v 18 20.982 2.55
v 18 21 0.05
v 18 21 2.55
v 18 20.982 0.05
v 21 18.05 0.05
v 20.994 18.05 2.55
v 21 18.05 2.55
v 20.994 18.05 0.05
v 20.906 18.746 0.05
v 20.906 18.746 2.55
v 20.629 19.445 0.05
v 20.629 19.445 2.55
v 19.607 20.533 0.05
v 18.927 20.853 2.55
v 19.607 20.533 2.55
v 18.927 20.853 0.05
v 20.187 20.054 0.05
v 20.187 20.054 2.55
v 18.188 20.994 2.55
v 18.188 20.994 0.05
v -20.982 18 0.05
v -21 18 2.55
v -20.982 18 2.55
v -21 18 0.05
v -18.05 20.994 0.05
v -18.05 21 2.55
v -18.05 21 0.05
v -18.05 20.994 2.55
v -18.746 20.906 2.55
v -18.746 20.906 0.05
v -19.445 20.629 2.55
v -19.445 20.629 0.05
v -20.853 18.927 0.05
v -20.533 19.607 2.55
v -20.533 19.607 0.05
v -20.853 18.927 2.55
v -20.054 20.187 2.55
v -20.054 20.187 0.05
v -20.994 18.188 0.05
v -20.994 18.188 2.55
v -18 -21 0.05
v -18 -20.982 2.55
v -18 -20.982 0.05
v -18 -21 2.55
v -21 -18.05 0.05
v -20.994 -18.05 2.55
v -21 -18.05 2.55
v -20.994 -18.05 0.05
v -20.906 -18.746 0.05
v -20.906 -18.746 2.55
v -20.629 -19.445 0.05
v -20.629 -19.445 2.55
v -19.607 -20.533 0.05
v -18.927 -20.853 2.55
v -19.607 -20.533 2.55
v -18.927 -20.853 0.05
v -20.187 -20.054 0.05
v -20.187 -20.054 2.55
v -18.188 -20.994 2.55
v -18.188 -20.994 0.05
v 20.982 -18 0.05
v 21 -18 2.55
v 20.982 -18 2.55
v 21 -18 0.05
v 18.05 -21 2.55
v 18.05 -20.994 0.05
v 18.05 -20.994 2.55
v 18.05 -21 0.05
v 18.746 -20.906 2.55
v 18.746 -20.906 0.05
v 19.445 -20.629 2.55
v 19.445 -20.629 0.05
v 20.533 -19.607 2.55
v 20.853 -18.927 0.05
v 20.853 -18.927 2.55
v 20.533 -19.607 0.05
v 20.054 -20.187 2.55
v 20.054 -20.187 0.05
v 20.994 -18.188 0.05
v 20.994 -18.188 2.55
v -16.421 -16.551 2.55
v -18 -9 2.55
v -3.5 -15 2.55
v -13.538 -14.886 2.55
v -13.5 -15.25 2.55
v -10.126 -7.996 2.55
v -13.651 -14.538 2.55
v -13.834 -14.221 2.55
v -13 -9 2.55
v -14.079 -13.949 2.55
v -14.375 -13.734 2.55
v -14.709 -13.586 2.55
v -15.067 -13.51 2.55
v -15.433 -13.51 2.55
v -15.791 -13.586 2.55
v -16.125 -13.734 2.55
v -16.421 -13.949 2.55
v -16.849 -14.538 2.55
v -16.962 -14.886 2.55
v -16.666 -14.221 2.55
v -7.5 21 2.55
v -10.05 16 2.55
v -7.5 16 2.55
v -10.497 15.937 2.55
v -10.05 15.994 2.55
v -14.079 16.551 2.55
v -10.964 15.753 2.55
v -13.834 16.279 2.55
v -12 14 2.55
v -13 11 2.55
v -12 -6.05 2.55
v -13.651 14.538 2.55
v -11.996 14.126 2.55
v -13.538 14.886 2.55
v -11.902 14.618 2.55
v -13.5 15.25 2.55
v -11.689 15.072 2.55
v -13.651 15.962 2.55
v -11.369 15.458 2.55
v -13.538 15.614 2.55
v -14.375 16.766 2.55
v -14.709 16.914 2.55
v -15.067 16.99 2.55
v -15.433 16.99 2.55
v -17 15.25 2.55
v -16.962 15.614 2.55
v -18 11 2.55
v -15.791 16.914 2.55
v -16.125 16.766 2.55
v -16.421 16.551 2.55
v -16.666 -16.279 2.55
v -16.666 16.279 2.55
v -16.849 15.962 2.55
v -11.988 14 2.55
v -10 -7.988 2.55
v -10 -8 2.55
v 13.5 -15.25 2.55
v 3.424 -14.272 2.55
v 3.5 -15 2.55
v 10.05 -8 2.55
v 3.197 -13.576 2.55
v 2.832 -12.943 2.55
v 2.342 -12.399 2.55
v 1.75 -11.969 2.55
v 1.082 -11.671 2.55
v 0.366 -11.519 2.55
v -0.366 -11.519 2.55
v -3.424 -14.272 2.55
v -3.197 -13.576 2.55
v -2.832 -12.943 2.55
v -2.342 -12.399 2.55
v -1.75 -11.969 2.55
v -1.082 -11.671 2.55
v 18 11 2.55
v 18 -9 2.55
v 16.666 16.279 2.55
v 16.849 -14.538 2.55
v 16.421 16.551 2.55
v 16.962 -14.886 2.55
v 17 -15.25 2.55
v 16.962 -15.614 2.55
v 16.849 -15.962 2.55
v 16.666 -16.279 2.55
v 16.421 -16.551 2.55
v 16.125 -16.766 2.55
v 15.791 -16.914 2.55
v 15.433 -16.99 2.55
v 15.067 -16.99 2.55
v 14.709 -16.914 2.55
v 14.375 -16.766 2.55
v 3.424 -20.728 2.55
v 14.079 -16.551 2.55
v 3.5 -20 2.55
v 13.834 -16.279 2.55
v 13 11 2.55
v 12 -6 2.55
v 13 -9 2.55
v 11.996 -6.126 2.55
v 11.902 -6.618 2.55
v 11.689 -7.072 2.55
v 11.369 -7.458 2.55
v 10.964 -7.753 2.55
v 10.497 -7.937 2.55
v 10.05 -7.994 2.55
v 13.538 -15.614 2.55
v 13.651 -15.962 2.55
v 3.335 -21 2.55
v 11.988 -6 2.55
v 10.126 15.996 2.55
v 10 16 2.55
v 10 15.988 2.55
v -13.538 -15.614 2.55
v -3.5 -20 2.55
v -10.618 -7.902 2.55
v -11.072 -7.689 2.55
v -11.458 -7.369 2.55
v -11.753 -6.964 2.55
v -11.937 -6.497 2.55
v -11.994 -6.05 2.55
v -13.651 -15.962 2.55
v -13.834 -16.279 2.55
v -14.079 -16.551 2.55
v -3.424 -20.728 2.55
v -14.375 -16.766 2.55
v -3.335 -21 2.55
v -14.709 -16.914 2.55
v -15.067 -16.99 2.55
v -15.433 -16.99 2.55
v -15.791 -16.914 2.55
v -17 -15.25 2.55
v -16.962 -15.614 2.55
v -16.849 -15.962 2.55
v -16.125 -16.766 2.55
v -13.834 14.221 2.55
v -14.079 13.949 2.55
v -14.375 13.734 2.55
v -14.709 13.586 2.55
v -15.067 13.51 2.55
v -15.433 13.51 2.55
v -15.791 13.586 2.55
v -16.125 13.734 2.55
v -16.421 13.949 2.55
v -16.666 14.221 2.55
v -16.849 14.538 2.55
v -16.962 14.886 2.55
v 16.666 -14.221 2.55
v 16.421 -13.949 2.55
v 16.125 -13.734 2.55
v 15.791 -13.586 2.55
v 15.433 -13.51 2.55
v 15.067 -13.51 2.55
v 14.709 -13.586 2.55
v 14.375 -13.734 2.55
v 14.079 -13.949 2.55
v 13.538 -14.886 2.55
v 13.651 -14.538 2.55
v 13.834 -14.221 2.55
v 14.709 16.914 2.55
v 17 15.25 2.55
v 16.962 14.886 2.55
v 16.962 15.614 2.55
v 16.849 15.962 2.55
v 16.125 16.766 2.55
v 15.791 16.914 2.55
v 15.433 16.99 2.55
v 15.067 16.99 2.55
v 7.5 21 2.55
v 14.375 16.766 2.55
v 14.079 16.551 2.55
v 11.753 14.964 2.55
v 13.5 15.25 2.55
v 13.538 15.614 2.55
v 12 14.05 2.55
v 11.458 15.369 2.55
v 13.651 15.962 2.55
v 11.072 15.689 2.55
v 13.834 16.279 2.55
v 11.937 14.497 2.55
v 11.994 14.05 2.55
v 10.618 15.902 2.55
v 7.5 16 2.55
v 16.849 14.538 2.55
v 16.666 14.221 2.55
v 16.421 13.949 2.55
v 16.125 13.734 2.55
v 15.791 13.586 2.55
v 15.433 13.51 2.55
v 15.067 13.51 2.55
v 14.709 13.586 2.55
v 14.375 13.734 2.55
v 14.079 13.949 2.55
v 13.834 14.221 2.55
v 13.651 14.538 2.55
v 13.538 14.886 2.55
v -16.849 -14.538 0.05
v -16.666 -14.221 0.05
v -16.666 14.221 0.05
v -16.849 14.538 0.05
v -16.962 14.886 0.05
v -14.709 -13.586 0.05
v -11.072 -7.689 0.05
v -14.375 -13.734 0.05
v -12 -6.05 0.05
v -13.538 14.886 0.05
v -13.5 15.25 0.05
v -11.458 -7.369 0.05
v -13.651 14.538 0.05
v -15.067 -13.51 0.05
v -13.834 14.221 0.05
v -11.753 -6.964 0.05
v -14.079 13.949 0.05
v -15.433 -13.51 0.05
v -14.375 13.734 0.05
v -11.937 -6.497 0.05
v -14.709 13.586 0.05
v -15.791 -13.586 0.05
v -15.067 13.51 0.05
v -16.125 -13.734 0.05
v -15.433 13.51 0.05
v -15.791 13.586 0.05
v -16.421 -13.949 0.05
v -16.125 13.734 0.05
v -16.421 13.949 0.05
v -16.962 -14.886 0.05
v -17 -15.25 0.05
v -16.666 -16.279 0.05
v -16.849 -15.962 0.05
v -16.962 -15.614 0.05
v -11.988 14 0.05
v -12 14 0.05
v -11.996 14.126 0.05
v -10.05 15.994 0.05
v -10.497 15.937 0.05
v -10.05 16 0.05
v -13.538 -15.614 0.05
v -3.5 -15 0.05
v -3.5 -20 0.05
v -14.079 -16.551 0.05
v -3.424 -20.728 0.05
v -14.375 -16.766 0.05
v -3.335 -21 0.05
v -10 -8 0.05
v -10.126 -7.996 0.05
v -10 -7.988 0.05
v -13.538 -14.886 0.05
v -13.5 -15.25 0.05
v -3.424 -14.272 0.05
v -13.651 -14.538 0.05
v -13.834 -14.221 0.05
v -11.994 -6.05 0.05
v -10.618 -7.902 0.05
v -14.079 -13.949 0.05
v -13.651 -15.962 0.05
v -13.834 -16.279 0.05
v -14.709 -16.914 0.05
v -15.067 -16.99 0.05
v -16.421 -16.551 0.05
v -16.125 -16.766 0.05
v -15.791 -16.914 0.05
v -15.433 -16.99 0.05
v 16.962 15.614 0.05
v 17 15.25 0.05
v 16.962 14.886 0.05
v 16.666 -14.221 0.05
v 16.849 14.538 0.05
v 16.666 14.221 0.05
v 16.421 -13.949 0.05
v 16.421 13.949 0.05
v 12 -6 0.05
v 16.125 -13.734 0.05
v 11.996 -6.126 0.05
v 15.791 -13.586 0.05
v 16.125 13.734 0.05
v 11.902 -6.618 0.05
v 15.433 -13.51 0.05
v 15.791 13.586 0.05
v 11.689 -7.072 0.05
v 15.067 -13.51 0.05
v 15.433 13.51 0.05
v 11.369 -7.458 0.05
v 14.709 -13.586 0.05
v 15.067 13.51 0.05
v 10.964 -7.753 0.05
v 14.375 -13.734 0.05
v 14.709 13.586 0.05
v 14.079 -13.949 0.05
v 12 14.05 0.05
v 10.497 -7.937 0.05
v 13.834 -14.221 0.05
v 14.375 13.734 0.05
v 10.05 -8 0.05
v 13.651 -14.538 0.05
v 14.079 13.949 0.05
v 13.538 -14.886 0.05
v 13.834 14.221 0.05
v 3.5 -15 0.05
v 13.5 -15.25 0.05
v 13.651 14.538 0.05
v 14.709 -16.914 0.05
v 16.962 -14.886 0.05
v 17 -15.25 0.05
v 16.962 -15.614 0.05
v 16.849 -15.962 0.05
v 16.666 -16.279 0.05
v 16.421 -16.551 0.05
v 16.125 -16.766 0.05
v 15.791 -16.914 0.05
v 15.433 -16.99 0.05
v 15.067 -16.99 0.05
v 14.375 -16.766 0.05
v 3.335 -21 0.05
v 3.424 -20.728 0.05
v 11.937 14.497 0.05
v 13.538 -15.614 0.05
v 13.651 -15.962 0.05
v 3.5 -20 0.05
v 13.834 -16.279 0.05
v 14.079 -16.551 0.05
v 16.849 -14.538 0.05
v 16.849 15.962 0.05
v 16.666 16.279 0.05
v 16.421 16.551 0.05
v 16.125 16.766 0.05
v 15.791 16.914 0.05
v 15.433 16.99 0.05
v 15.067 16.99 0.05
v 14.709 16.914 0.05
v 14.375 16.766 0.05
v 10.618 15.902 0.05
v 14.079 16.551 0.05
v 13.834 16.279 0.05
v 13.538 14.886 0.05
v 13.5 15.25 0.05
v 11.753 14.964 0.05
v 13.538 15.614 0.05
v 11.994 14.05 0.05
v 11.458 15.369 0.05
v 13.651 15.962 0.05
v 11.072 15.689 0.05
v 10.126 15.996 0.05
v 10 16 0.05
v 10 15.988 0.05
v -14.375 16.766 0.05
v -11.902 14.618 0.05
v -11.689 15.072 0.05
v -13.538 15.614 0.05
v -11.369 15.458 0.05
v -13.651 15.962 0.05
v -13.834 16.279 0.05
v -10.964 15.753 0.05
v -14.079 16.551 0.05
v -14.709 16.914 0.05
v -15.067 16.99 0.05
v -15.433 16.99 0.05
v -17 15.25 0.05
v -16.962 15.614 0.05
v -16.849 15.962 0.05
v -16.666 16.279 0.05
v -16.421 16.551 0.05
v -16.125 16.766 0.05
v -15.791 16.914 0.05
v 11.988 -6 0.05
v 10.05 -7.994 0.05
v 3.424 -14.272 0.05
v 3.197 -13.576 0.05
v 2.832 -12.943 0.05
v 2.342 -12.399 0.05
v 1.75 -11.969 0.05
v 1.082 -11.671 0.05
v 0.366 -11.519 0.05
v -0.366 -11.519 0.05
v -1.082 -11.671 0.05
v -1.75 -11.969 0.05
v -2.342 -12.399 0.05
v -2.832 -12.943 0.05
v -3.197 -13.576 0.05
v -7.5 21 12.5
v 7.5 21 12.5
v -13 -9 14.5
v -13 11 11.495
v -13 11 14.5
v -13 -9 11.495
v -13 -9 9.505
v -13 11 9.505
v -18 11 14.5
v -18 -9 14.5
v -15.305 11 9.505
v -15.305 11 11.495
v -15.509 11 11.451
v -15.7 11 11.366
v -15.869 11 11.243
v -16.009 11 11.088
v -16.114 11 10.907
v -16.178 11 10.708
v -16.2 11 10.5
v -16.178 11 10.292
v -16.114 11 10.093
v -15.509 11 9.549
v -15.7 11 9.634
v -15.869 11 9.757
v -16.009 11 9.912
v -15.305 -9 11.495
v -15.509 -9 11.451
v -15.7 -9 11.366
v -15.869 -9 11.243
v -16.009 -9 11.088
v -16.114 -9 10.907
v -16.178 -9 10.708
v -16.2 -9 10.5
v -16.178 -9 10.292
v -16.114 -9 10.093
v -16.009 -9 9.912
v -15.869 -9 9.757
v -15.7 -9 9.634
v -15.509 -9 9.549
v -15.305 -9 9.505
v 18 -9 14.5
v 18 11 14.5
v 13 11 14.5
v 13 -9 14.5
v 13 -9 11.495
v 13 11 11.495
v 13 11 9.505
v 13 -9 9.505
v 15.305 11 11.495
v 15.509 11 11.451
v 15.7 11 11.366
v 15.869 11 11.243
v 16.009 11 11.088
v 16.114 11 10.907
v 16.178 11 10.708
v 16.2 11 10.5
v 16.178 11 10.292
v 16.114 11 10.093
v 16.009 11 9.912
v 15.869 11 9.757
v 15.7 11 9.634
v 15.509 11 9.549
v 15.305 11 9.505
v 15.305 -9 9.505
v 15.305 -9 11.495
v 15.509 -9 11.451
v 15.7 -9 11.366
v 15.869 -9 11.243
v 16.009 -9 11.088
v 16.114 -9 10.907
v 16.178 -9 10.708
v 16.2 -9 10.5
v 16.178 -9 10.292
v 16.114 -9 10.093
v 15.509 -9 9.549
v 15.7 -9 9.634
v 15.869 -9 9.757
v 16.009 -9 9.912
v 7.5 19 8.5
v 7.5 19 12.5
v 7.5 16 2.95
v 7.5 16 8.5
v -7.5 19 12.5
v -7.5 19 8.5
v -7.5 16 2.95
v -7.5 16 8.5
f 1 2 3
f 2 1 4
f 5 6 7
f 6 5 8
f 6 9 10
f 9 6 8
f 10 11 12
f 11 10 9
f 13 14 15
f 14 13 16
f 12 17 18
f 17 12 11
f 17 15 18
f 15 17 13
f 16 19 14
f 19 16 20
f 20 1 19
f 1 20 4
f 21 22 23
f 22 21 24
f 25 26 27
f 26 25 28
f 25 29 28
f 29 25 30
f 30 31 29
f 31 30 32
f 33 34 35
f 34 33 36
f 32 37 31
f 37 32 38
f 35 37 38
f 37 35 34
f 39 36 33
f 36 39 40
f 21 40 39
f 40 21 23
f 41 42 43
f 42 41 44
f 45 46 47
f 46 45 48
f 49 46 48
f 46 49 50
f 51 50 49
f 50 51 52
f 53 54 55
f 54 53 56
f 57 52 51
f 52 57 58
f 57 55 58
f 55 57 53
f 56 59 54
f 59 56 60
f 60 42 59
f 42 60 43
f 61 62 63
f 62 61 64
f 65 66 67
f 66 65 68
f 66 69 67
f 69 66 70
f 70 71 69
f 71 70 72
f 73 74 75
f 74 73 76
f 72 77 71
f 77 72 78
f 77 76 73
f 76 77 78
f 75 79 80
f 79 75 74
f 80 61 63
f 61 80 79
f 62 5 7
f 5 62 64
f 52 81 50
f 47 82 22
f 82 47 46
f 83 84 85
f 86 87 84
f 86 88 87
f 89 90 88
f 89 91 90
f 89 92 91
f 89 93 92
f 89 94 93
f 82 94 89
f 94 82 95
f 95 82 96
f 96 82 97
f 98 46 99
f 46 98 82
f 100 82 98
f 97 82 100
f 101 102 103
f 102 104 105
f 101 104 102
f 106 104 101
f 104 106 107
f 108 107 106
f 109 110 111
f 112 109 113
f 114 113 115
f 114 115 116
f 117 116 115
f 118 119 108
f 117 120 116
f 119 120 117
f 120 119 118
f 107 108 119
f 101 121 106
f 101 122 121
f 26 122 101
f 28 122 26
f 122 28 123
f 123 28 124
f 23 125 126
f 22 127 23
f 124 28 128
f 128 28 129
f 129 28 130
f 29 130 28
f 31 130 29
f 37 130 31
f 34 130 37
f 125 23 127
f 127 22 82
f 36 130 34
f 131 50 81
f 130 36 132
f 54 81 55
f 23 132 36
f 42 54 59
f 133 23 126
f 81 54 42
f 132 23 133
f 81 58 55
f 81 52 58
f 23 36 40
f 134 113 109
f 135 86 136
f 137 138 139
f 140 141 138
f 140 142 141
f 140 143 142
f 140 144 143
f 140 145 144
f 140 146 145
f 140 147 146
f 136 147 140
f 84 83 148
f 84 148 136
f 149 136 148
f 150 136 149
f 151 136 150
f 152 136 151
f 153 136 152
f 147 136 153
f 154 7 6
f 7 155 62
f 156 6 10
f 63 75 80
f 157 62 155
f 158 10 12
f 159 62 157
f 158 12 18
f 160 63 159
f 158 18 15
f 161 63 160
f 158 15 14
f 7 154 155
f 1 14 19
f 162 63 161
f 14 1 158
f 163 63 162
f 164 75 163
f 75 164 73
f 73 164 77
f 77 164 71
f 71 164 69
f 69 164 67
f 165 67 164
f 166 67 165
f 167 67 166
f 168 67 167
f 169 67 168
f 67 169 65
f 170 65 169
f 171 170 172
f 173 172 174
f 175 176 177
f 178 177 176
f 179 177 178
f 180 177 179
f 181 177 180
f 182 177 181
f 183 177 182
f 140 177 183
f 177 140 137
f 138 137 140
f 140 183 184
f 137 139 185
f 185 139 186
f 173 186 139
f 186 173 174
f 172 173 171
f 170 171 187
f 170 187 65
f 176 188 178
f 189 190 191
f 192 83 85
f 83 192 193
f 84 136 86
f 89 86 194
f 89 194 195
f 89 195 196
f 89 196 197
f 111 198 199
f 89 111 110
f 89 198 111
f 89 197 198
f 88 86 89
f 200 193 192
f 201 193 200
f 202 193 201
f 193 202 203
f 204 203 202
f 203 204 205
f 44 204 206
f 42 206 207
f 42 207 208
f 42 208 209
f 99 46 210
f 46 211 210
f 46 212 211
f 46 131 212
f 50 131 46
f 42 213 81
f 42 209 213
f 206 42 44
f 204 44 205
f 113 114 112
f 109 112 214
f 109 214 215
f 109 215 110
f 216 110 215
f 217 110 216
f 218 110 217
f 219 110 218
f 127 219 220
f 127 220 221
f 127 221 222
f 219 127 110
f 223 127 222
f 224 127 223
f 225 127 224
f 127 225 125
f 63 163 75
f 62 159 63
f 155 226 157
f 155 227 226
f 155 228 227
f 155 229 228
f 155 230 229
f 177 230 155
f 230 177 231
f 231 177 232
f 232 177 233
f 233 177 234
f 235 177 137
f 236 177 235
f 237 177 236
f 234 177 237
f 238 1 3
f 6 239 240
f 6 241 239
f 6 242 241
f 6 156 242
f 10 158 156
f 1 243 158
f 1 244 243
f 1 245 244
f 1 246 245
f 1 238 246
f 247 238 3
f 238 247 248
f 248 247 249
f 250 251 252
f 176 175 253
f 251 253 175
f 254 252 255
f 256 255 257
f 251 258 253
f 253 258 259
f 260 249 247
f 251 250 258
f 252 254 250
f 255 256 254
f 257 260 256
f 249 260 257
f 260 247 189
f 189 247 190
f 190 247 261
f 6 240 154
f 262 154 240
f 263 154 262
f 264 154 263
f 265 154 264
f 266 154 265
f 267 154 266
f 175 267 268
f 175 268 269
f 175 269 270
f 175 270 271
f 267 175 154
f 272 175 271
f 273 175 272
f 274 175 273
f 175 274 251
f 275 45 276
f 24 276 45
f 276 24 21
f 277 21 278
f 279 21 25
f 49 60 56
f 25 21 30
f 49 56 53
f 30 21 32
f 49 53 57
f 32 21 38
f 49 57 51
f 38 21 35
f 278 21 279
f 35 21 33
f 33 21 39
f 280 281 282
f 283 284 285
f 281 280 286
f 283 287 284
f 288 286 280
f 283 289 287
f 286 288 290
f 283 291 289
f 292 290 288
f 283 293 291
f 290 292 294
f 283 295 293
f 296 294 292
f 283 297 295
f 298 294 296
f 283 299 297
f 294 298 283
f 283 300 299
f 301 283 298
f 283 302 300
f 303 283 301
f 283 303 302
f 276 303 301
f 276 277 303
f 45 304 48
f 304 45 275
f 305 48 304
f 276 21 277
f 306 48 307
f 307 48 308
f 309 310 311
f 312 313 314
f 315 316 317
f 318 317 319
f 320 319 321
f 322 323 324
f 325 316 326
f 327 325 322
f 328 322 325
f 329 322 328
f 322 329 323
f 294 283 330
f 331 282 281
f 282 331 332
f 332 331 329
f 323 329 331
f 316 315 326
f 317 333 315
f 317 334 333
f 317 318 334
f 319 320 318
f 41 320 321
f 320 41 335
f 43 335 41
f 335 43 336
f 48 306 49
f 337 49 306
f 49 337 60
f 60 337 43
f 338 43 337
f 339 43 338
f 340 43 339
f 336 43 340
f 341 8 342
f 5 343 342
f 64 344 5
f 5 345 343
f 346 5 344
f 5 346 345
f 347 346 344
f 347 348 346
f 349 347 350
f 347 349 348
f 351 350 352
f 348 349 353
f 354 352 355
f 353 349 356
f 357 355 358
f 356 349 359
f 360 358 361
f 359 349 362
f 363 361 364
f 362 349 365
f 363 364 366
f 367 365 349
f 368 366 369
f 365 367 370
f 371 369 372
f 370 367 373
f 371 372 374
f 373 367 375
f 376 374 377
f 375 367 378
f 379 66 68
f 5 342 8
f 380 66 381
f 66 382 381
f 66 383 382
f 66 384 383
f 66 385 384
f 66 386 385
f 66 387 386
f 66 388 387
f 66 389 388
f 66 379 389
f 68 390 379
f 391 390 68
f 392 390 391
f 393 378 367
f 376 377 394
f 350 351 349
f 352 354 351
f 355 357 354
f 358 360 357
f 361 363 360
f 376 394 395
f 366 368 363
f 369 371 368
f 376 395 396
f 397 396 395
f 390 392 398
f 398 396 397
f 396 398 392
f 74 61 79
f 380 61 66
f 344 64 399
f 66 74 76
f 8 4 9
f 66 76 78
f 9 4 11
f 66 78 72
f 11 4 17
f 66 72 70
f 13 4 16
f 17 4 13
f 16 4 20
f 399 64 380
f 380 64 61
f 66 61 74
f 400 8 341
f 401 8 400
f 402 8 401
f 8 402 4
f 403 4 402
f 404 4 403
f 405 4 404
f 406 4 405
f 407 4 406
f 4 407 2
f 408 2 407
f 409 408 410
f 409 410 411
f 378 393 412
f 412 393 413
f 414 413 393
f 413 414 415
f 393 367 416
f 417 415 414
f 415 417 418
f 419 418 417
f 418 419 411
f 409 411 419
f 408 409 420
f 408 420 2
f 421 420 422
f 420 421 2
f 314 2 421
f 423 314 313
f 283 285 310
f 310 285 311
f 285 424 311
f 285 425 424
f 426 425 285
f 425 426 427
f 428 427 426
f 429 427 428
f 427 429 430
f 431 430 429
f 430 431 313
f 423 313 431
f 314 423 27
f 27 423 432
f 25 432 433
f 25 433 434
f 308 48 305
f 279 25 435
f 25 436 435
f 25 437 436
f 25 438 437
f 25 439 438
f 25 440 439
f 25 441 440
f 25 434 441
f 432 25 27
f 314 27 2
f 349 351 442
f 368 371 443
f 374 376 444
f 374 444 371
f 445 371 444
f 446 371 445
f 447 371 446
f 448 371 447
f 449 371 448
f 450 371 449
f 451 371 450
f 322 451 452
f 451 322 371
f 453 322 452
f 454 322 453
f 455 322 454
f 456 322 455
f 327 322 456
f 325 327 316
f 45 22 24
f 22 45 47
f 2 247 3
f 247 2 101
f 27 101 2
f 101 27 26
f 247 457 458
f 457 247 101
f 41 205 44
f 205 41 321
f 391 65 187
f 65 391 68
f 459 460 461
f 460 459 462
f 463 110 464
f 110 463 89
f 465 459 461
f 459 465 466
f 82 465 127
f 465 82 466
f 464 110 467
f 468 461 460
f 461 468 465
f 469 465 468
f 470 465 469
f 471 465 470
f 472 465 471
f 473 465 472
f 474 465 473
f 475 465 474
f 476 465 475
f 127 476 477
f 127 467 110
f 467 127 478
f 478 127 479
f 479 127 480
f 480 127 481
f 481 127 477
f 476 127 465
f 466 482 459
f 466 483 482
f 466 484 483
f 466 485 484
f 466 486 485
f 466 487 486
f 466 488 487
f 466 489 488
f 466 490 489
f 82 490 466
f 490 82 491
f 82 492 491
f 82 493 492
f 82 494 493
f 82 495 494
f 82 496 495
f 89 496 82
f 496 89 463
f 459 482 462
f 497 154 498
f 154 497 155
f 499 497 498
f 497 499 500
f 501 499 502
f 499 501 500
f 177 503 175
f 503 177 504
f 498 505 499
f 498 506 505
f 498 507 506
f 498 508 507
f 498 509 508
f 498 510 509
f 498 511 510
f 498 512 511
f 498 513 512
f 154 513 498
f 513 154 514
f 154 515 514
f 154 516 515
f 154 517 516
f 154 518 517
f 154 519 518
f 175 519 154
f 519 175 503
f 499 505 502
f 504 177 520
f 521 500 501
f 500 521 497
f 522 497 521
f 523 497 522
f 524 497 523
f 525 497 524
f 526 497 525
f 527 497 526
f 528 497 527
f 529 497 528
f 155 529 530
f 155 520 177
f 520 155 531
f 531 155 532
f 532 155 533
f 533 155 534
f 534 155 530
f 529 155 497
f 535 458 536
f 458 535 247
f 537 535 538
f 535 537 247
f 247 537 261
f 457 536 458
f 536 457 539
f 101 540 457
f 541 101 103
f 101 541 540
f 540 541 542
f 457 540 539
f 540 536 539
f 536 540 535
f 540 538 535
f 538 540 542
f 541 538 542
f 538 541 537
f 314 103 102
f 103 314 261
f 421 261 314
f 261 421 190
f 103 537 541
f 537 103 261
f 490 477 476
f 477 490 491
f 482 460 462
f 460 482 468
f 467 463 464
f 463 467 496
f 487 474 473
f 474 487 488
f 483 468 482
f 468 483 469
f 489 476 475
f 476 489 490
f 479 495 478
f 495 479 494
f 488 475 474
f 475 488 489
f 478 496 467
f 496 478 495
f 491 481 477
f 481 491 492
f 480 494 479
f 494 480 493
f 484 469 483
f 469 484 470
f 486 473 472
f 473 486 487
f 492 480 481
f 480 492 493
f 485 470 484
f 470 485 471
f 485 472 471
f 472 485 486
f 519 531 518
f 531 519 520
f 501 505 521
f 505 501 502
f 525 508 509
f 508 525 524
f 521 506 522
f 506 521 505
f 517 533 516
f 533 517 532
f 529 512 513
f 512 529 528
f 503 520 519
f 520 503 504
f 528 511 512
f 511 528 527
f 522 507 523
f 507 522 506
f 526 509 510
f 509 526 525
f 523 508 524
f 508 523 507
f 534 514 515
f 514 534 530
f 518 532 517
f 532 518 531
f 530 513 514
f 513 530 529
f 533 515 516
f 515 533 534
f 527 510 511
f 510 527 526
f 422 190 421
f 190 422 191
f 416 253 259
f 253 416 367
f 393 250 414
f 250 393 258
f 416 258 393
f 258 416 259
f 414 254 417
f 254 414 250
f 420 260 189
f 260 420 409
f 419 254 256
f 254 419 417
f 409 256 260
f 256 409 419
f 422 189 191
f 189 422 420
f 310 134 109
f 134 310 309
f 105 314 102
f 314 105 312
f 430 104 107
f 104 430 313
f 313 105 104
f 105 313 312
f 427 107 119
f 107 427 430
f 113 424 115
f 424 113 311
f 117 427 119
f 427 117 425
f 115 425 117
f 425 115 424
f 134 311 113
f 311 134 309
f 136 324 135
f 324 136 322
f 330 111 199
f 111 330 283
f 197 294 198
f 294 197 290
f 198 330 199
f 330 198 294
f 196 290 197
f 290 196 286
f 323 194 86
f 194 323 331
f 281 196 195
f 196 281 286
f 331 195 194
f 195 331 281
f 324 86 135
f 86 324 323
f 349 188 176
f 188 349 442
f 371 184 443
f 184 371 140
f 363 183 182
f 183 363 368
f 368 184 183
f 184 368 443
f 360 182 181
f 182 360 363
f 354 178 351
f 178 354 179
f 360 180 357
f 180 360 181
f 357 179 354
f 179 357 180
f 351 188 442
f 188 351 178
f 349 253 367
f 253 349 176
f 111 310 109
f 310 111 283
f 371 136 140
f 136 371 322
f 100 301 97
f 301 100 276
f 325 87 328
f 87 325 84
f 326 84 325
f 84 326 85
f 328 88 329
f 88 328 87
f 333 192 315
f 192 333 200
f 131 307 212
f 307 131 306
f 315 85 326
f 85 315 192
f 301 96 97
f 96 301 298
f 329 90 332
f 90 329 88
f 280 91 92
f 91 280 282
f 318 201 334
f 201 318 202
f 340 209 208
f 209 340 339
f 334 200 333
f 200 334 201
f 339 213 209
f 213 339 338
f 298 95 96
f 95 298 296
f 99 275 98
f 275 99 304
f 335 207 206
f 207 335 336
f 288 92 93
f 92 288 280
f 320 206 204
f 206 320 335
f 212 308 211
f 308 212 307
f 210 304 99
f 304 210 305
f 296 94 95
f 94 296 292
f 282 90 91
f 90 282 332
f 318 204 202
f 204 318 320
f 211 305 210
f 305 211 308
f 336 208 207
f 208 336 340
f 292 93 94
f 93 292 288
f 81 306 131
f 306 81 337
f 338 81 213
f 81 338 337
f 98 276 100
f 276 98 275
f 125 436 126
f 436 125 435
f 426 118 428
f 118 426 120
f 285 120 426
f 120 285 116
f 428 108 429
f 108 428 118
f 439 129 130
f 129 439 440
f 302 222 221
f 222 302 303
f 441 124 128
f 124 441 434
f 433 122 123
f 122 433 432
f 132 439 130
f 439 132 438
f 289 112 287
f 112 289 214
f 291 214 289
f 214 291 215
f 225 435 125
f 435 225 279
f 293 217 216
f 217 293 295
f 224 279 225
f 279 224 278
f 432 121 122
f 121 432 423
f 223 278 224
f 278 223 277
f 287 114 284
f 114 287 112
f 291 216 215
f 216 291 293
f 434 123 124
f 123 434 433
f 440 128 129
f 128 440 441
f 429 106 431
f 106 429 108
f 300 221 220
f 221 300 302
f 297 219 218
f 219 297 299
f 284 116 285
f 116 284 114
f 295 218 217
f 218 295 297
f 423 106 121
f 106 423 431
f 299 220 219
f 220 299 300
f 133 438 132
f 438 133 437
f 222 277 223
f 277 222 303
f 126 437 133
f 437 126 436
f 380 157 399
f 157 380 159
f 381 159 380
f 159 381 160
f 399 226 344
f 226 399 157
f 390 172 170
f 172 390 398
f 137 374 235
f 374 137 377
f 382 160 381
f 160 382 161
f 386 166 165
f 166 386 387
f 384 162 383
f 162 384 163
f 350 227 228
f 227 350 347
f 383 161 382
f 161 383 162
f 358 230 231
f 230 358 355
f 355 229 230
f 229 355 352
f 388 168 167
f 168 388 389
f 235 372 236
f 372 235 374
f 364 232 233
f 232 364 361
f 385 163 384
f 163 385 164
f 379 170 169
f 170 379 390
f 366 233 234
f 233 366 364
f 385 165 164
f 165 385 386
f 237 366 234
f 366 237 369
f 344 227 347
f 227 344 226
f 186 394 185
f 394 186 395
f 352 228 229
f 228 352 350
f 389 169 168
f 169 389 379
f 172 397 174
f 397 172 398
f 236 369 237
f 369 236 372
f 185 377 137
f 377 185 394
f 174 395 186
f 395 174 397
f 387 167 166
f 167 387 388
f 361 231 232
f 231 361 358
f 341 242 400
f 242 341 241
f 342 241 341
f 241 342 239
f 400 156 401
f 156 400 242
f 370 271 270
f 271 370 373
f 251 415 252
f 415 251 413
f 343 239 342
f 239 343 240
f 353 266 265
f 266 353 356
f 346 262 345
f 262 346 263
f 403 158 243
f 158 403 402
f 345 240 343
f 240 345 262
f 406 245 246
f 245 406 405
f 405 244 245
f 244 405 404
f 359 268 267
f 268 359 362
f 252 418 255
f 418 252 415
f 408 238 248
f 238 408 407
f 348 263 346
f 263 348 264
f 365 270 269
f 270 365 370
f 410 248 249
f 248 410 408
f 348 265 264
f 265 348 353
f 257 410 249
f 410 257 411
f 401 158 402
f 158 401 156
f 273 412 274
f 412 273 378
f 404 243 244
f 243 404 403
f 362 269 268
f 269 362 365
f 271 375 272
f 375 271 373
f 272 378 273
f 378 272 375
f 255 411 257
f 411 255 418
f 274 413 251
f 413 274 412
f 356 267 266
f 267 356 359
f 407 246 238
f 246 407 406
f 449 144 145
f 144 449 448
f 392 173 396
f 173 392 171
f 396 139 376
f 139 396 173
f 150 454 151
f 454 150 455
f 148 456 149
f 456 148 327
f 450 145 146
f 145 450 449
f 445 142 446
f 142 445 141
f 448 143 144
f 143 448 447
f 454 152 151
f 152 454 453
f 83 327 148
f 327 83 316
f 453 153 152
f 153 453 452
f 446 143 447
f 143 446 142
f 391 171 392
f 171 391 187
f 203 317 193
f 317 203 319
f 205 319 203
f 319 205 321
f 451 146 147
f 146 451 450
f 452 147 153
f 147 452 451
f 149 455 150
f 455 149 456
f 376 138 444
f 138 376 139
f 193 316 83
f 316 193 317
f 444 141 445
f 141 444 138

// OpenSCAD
// file: library/nutsnbolts/data-access.scad
// Norm Nuts and Bolts - a OpenSCAD library
// Copyright (C) 2012  Johannes Kneer

// This program is free software: you can redistribute it and/or modify
// it under the terms of the GNU General Public License as published by
// the Free Software Foundation, either version 3 of the License, or
// (at your option) any later version.

// This program is distributed in the hope that it will be useful,
// but WITHOUT ANY WARRANTY; without even the implied warranty of
// MERCHANTABILITY or FITNESS FOR A PARTICULAR PURPOSE.  See the
// GNU General Public License for more details.

// You should have received a copy of the GNU General Public License
// along with this program.  If not, see <http://www.gnu.org/licenses/>.


// DATABASE ACCESS FUNCTIONS AND CONSTANTS



// == CONSTANTS ==

// screw table access keys
_NB_S_DESC            = 0;
_NB_S_FAMKEY			    = 1;
_NB_S_LENGTH          = 2;
_NB_S_NOTHREAD_LENGTH = 3;

_NB_F_DESC			      = 0;
_NB_F_OUTER_DIA       = 1;
_NB_F_INNER_DIA       = 2;
_NB_F_LEAD            = 3;
_NB_F_KEY             = 4;
_NB_F_KEY_DEPTH       = 5;
_NB_F_HEAD_HEIGHT     = 6;
_NB_F_HEAD_DIA        = 7;
_NB_F_NUT_KEY         = 8;
_NB_F_NUT_HEIGHT      = 9;
_NB_F_PITCH_FINE      = 10;
_NB_F_PITCH_MEDIUM    = 11;
_NB_F_PITCH_COARSE    = 12;


// == FUNCTIONS ==

// _get_screw("descriptor")   with descriptor = M8x25
//   find the line for a general object in the data matrix

function _get_screw(n) = data_screw[search([n], data_screw)[0]];
function _get_screw_fam(n) = data_screw_fam[search([_get_screw(n)[_NB_S_FAMKEY]], data_screw_fam)[0]];

function _get_fam(n) = data_screw_fam[search([n], data_screw_fam)[0]];


// _get_XXXXX("descriptor") functions
// find a single property in the database

function _get_desc(n)        = _get_screw(n)[_NB_S_DESC];
function _get_famkey(n)         = _get_screw(n)[_NB_S_FAMKEY];
function _get_length(n)      = _get_screw(n)[_NB_S_LENGTH];
function _get_nt_length(n)   = _get_screw(n)[_NB_S_NOTHREAD_LENGTH];

function _get_outer_dia(n)   = _get_screw_fam(n)[_NB_F_OUTER_DIA];
function _get_inner_dia(n)   = _get_screw_fam(n)[_NB_F_INNER_DIA];
function _get_lead(n)        = _get_screw_fam(n)[_NB_F_LEAD];
function _get_head_height(n) = _get_screw_fam(n)[_NB_F_HEAD_HEIGHT];
function _get_head_dia(n)    = _get_screw_fam(n)[_NB_F_HEAD_DIA];
function _get_nut_key(n)     = _get_screw_fam(n)[_NB_F_NUT_KEY];
function _get_nut_height(n)  = _get_screw_fam(n)[_NB_F_NUT_HEIGHT];
function _get_fine_pitch(n)  = _get_screw_fam(n)[_NB_F_PITCH_FINE];
function _get_medium_pitch(n)  = _get_screw_fam(n)[_NB_F_PITCH_MEDIUM];
function _get_coarse_pitch(n)  = _get_screw_fam(n)[_NB_F_PITCH_COARSE];
// file: videotx.scad
// video transmitter - a OpenSCAD 
// Copyright (C) 2015  Gerard Valade

// This program is free software: you can redistribute it and/or modify
// it under the terms of the GNU General Public License as published by
// the Free Software Foundation, either version 3 of the License, or
// (at your option) any later version.

// This program is distributed in the hope that it will be useful,
// but WITHOUT ANY WARRANTY; without even the implied warranty of
// MERCHANTABILITY or FITNESS FOR A PARTICULAR PURPOSE.  See the
// GNU General Public License for more details.

// You should have received a copy of the GNU General Public License
// along with this program.  If not, see <http://www.gnu.org/licenses/>.

module videoTX($fn = 30)
{
	gold = [0.9, 0.8, 0.2];
	white = [0.9, 0.9, 0.9];
	black = [0.2, 0.2, 0.2];
	module connector(w)
	{
		 difference() {
			color(black)  cube([w, 12, 6.5], center=false);
			color(white) translate([1,-2, 1]) cube([w-2, 10, 4.5], center=false);
		}
	}
		
	translate([0, 0, 0.6]) color([0.4, 0.4, 0.4]) cube([26.24, 38.25, 1.2], center=true);
	translate([0, 0, 1.2]) {
		translate([1, 5, 0]) color(black) cube([11, 11, 5.5], center=false);
		translate([0, -6, 0]) cylinder(d=8.26, h=6);
		translate([8.5, -6, 0]) cylinder(d=6.76, h=6);
	} 
	translate([-12, -12, -10.5]) cube([25, 30, 10.5], center=false);
//	translate([6, 19, -4]) rotate([-90,0,0]) color(gold)  cylinder(d=6.26, h=13);
	translate([7.2, 19, -5]) rotate([-90,0,0]) {
		difference() {
		color(gold)  cylinder(d=6.21, h=13);
		translate([0,0,11]) color(white)  cylinder(d=5, h=3);
		}
		color(gold)  cylinder(d=0.5, h=13);
	} 
	translate([-12, -28, -6.5])  connector(10);
	translate([4, -28, -6.5])  connector(7.8); //color(black)  cube([7.8, 12, 6.5], center=false);
}

//videoTX();
// file: library/round-corners-cube.scad
/*
http://codeviewer.org/view/code:1b36 
Copyright (C) 2011 Sergio Vilches
This program is free software: you can redistribute it and/or modify it under the terms of the GNU General Public License as published by the Free Software Foundation, either version 3 of the License, or (at your option) any later version.
This program is distributed in the hope that it will be useful, but WITHOUT ANY WARRANTY; without even the implied warranty of MERCHANTABILITY or FITNESS FOR A PARTICULAR PURPOSE. See the GNU General Public License for more details. You should have received a copy of the GNU General Public License along with this program. If not, see <http://www.gnu.org/licenses/>.
Contact: s.vilches.e@gmail.com


    ----------------------------------------------------------- 
                 Round Corners Cube (Extruded)                
      round_corners_cube(x,y,z,r) Where:                        
         - x = Xdir width                                     
         - y = Ydir width                                     
         - z = Height of the cube                             
         - r = Rounding radious                               
                                                              
      Example: roundCornerCube(10,10,2,1);                    
     *Some times it's needed to use F6 to see good results!   
 	 ----------------------------------------------------------- 
*/
// Test it!
// round_corners_cube(10,5,2,1);


module createMeniscus(h,radius) // This module creates the shape that needs to be substracted from a cube to make its corners rounded.
difference(){        //This shape is basicly the difference between a quarter of cylinder and a cube
   translate([radius/2+0.1,radius/2+0.1,0]){
      cube([radius+0.2,radius+0.1,h+0.2],center=true);         // All that 0.x numbers are to avoid "ghost boundaries" when substracting
   }

   cylinder(h=h+0.2,r=radius,$fn = 25,center=true);
}


module round_corners_cube(x,y,z,r)  // Now we just substract the shape we have created in the four corners
difference(){
   cube([x,y,z], center=true);

translate([x/2-r,y/2-r]){  // We move to the first corner (x,y)
      rotate(0){  
         createMeniscus(z,r); // And substract the meniscus
      }
   }
   translate([-x/2+r,y/2-r]){ // To the second corner (-x,y)
      rotate(90){
         createMeniscus(z,r); // But this time we have to rotate the meniscus 90 deg
      }
   }
      translate([-x/2+r,-y/2+r]){ // ... 
      rotate(180){
         createMeniscus(z,r);
      }
   }
      translate([x/2-r,-y/2+r]){
      rotate(270){
         createMeniscus(z,r);
      }
   }
}
// file: library/params.scad
//function isfull_view(n) = n==full_view;

bottom_plate_color = [0.3, 0.7, 0.7];
top_plate_color = [0.8, 0.8, 0.3];
damper_color = [0.8, 0.2, 0.3];
gps_bracket_color = [0.3, 0.8, 0.3, 1];
option_bracket_color = [0.8, 0.8, 0.3];
pillar_color = [0.8, 0.5, 0.3];
cut_color = [0.9, 0, 0];

cc3d_hole_width = 30.5;
cut_view=false;
debug=false;
//viewModule = isfull_view(viewType);
cut_view_debug=0;

M25_outer_dia=2.8; 
M25_inner_dia=2.05; 
M25_head_dia=5;
M3_outer_dia=3.5; 
M3_inner_dia=2.8;
M3_head_dia=5.4+0.5;
// SMA Thread
M6_outer_dia=6.8;



plate_tin = 2.2;

pillar_heigth = 27;

pillar_hole_width = 64;
pillar_hole_length = 64;

option_hole_length = cc3d_hole_width;
option_hole_width = cc3d_hole_width;



DAMPER_EARS_DRAW_TOP=[0,1];
DAMPER_EARS_DRAW_BOTTOM=[0,0];
DAMPER_EARS_SHOW_DAMPER=[1,1];
DAMPER_EARS_CUT_BOTTOM=[2,0];
DAMPER_EARS_CUT_TOP=[2,1];
// main file
// tarot 680 pro - a OpenSCAD 
// Copyright (C) 2015  Gerard Valade

// This program is free software: you can redistribute it and/or modify
// it under the terms of the GNU General Public License as published by
// the Free Software Foundation, either version 3 of the License, or
// (at your option) any later version.

// This program is distributed in the hope that it will be useful,
// but WITHOUT ANY WARRANTY; without even the implied warranty of
// MERCHANTABILITY or FITNESS FOR A PARTICULAR PURPOSE.  See the
// GNU General Public License for more details.

// You should have received a copy of the GNU General Public License
// along with this program.  If not, see <http://www.gnu.org/licenses/>.


include <library/params.scad>
use <library/modules-utils.scad>
use <library/round-corners-cube.scad>
use <videotx.scad>

module pcb_holder(full_view, $fn=30)
{
	base_length = 42;//36;
	base_width = 42;//42;
	plate_tin=2.5;
	ww = 20; 
	espacer = 19;
	pcb_width=30;

	translate([0, 0, 0]) difference()
	{
		color(option_bracket_color)  
		union() {
			translate([0, 0, 1.3]) round_corners_cube(base_length, base_width, plate_tin, 3);
			
			translate([0, 20,  plate_tin+5]) cube([15, 2, 10], center=true);
			translate([0, 18,  plate_tin+2.5]) cube([15, 4, 7], center=true);
			
			color(option_bracket_color) for (x = [-1, 1]) {
				for (y = [0]) {
					translate([x*(pcb_width+1)/2, 1,  plate_tin+6]) cube([5, ww, 12], center=true);
				}
			}
		}
		for (x = [-1, 1]) {
			for (y = [0]) {
				if (debug) #translate([x*(pcb_width)/2, 0,  plate_tin+8]) rotate([90, 0, 0]) cylinder(d=0.2, h=50, center=true);
				hull() {
					translate([x*((pcb_width+0.4)/2), 0,  plate_tin+8]) rotate([90, 0, 0]) cylinder(d=2, h=30, center=true);
					translate([x*((pcb_width-5)/2), 0,  plate_tin+8]) rotate([90, 0, 0]) cylinder(d=2, h=30, center=true);
				}
			}
		}

		hull() {
			translate([0, -15,  0]) rotate([0, 0, 0]) cylinder(d=7, h=50, center=true);
			translate([0, -20,  0]) rotate([0, 0, 0]) cylinder(d=7, h=50, center=true);
		}
		translate([0, 4, 1.2]) round_corners_cube(base_length-18, base_width-18, plate_tin+1, 2);
		
		// fixing hole
		translate([-base_length/2+5.75, 0, -0.1]) draw_option_spacer(hole_dia=M3_outer_dia, center=false);
	}

	if (full_view)
	{
		translate([0, 5, plate_tin+8]) color([0., 0.2, 0.])  cube([30, 28, 1.5], center=true);
	}
}

	
translate([0, 0, 0]) pcb_holder();	
